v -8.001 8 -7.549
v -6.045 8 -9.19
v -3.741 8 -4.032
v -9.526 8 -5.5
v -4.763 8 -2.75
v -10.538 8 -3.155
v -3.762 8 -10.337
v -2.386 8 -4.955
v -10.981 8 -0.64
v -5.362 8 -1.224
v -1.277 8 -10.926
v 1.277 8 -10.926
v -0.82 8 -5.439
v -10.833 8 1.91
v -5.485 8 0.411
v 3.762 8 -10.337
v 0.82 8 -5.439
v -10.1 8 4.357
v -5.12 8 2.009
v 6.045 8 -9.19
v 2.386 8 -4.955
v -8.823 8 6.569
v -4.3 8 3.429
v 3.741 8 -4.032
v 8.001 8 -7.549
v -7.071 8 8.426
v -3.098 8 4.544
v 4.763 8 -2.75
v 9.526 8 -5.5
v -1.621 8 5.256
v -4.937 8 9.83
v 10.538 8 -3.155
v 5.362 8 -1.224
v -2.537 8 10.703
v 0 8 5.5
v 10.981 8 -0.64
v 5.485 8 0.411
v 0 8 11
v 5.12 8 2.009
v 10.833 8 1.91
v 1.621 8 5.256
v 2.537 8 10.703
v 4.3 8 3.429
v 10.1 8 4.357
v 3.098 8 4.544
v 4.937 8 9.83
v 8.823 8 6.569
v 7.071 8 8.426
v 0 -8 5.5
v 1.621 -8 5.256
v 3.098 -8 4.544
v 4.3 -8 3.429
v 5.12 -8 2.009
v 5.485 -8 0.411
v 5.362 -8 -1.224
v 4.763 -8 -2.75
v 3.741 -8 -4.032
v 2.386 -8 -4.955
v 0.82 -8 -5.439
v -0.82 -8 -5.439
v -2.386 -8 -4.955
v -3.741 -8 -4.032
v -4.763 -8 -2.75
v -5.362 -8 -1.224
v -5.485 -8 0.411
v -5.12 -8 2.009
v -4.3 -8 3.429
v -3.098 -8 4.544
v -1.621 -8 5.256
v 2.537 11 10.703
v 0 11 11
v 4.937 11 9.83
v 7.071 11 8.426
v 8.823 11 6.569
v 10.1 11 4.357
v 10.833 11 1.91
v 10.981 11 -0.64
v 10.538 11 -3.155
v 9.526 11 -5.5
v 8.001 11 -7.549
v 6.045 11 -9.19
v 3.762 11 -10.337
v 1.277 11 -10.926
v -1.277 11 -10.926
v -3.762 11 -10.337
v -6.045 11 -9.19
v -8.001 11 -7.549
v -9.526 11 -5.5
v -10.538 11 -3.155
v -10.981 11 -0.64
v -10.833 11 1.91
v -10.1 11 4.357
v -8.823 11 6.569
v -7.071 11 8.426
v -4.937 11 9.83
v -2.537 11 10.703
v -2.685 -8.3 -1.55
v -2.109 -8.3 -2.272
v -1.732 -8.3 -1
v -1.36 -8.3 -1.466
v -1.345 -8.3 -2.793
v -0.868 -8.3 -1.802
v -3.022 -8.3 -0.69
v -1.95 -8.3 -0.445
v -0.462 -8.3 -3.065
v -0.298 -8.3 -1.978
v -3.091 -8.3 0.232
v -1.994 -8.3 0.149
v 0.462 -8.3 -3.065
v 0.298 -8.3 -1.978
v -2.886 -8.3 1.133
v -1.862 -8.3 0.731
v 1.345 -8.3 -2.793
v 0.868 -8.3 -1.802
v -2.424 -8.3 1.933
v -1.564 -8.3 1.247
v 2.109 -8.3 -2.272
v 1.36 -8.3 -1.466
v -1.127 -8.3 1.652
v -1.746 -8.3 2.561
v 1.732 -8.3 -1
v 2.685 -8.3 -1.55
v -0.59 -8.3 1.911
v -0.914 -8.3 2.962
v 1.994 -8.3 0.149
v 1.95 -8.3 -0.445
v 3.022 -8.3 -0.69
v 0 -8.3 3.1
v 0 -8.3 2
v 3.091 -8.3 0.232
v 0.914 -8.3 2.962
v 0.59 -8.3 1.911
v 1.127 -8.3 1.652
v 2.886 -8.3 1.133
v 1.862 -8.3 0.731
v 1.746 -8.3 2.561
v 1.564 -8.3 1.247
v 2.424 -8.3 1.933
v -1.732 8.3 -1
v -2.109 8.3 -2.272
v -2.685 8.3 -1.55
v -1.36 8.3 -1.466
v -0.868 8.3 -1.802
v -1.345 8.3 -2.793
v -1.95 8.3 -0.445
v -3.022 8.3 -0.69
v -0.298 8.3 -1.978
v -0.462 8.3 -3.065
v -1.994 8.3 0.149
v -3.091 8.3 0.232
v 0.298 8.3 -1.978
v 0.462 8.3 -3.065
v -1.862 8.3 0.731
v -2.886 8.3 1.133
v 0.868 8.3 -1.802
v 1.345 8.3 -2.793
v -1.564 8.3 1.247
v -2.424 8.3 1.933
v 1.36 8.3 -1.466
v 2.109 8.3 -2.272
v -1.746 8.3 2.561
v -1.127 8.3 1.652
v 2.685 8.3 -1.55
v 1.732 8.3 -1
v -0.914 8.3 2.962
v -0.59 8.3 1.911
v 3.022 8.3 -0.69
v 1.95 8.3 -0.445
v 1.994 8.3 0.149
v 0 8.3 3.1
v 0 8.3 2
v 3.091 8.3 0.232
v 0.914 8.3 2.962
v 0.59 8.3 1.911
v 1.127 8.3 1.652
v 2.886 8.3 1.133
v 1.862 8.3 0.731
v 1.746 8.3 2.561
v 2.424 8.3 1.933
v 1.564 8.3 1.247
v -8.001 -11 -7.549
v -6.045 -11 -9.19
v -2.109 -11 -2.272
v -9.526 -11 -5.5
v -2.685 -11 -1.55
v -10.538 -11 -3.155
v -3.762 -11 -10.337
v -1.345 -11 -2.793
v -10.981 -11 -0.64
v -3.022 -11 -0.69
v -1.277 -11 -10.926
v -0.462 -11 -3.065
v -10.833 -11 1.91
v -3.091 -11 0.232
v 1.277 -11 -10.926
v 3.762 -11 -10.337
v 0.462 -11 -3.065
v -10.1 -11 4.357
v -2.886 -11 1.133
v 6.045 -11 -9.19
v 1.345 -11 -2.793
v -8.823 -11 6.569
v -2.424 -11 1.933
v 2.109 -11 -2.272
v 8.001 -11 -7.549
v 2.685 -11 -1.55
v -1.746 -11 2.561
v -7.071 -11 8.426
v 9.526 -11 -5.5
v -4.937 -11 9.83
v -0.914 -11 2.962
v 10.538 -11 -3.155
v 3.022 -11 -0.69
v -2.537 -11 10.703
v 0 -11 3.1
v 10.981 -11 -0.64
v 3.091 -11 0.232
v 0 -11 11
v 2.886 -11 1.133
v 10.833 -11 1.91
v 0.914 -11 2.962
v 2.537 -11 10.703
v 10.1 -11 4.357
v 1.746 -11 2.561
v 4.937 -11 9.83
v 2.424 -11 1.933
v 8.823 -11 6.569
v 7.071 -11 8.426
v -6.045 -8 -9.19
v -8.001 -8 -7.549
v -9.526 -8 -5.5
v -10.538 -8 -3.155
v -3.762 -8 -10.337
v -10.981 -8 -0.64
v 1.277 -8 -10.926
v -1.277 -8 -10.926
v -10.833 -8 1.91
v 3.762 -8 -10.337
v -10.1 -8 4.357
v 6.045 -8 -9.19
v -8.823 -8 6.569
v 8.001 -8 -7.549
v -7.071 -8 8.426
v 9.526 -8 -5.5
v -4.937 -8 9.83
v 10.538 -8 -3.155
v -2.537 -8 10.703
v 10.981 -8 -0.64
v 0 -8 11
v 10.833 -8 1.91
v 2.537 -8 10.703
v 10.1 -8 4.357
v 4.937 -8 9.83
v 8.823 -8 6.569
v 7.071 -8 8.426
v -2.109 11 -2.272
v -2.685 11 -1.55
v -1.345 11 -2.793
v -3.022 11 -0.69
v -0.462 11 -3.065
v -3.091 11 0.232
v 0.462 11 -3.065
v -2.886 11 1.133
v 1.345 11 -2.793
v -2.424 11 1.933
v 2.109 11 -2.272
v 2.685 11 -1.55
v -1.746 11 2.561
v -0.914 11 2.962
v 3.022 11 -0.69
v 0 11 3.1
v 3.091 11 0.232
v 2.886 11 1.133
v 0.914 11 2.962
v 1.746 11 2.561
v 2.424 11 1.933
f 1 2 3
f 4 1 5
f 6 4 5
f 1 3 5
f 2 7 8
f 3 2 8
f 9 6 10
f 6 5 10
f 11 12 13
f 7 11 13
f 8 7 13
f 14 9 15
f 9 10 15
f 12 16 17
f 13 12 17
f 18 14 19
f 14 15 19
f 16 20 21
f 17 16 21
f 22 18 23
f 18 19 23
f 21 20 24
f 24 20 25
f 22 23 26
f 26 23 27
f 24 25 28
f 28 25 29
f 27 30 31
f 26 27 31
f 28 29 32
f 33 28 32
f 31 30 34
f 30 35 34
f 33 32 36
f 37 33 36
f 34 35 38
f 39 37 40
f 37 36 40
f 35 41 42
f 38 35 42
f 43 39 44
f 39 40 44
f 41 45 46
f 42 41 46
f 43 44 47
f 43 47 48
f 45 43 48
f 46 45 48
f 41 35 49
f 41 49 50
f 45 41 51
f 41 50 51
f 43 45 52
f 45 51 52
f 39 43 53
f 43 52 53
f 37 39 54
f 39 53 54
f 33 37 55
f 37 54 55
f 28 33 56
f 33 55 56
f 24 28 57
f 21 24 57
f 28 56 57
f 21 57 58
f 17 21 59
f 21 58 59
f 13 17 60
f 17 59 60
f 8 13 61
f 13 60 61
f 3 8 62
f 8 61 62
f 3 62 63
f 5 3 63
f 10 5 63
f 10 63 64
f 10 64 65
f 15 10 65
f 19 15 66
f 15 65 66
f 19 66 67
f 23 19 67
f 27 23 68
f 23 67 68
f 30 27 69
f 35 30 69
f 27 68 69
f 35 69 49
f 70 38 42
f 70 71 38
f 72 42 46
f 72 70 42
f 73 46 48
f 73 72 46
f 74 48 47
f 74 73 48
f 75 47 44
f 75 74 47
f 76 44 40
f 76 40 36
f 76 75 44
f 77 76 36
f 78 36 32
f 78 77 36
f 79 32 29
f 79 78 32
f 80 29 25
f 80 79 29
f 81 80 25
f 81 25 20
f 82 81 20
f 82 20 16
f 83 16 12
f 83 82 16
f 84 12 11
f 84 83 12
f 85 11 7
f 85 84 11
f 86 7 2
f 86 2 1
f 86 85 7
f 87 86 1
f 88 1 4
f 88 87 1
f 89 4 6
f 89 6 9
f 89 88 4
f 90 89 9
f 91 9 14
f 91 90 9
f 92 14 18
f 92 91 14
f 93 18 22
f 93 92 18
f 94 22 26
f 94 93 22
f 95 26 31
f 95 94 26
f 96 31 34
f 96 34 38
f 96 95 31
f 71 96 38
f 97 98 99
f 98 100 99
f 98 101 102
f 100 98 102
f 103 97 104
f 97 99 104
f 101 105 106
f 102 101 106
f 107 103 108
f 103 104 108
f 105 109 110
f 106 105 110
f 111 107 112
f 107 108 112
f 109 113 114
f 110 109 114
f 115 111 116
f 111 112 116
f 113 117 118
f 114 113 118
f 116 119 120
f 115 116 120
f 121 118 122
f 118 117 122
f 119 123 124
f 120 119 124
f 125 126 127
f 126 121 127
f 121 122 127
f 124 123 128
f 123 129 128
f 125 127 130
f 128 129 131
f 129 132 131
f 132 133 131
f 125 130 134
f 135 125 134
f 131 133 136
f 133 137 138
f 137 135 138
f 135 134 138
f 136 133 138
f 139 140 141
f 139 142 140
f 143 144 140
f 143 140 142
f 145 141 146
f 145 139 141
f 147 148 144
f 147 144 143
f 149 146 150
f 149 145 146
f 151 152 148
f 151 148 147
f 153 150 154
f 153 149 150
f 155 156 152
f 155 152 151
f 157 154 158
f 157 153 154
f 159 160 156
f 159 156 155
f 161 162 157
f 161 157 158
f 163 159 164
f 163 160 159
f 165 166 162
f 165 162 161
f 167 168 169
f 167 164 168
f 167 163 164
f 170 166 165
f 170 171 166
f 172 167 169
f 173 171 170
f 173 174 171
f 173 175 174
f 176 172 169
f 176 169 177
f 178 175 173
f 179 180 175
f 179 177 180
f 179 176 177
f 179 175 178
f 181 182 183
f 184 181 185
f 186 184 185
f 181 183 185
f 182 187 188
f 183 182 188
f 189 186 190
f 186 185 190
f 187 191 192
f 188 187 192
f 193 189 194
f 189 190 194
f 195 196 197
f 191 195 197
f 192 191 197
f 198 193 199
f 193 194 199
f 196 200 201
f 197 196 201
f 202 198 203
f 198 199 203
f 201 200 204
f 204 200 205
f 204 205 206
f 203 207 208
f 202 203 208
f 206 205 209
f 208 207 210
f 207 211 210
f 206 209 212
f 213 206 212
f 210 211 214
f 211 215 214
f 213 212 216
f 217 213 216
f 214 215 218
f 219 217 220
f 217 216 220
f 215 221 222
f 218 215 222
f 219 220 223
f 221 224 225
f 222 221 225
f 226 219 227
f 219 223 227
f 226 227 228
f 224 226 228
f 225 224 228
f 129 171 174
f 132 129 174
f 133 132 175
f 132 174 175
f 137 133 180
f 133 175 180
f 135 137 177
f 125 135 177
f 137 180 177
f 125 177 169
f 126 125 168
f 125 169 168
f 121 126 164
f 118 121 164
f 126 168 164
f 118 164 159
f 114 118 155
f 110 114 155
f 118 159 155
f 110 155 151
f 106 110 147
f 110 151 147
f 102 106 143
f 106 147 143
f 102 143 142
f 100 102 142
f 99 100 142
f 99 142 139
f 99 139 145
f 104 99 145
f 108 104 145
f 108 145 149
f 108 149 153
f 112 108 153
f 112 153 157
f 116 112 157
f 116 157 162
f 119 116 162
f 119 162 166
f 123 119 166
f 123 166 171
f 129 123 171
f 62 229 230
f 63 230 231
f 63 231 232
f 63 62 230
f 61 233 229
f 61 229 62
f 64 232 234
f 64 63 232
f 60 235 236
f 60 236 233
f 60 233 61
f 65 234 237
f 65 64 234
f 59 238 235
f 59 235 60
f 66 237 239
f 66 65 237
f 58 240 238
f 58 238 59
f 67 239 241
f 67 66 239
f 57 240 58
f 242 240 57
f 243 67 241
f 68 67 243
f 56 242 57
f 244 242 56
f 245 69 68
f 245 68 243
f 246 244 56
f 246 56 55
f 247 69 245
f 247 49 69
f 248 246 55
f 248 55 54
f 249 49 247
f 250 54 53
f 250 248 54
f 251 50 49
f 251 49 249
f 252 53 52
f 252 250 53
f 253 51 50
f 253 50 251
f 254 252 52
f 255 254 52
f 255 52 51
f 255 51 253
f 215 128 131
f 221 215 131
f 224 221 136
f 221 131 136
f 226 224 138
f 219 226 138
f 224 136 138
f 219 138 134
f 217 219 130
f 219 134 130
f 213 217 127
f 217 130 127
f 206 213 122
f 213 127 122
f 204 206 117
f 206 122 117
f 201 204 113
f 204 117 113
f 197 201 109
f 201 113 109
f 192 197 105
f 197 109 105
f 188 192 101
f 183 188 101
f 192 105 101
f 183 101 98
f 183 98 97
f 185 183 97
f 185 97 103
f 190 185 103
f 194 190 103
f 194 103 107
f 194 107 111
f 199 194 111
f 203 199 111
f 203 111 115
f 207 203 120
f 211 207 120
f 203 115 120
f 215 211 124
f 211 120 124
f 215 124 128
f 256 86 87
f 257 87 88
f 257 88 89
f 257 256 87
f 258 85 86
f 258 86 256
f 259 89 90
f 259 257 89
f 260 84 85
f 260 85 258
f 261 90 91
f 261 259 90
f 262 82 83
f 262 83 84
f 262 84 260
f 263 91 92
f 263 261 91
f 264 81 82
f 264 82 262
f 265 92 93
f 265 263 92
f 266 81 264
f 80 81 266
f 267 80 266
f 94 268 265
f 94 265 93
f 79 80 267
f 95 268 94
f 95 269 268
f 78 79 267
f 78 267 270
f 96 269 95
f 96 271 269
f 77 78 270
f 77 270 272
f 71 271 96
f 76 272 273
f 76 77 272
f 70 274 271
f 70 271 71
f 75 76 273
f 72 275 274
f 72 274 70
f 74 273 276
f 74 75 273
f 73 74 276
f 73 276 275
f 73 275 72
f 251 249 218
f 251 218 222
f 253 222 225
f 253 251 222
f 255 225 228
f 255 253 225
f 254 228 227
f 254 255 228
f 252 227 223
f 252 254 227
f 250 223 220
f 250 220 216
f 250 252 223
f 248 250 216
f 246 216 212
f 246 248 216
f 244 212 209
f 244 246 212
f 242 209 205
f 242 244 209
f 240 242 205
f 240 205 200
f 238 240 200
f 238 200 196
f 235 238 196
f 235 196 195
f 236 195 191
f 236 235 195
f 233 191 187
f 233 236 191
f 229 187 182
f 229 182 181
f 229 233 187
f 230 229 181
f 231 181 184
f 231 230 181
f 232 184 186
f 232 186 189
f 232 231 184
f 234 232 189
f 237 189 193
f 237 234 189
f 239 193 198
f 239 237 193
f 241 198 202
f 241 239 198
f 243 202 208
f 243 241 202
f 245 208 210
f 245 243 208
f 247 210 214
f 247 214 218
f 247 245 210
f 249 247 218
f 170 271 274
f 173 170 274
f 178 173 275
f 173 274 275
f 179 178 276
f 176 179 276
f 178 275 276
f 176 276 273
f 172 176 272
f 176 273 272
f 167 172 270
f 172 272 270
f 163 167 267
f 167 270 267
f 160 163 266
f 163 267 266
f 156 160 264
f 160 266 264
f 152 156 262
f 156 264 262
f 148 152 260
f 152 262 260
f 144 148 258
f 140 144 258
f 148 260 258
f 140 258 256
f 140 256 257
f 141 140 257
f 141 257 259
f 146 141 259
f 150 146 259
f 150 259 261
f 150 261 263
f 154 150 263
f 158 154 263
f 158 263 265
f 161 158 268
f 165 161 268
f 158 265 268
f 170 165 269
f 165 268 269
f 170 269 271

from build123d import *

# Parameters (mm, degrees)
SKETCH_1_R          = 11
EXTRUDE_3_DEPTH     = 11
SKETCH_1_10_R       = 11
SKETCH_1_10_R_2     = 5.5
CUT_EXTRUDE_1_DEPTH = 8
SKETCH_2_R          = 2
CUT_EXTRUDE_2_DEPTH = 27.944387171
SKETCH_2_3_R        = 3.1
CUT_EXTRUDE_3_DEPTH = 2.7
CUT_EXTRUDE_START   = -19.3
SKETCH_2_4_R        = 3.1
CUT_EXTRUDE_4_DEPTH = 2.7


with BuildPart() as part:
    # 草图1 → 凸台-拉伸3 (new, symmetric)
    with BuildSketch(Plane(origin=(0, 0, 0), x_dir=(1, 0, 0), z_dir=(0, 1, 0))):
        with Locations(Location((0, 0, 0), (0, 0, 270))):
            Circle(SKETCH_1_R)
    extrude(amount=EXTRUDE_3_DEPTH, both=True)

    # 草图1<10> → 切除-拉伸1 (cut, symmetric)
    with BuildSketch(Plane(origin=(0, 0, 0), x_dir=(1, 0, 0), z_dir=(0, 1, 0))):
        with Locations(Location((0, 0, 0), (0, 0, 270))):
            Circle(SKETCH_1_10_R)
        with Locations(Location((0, 0, 0), (0, 0, 270))):
            Circle(SKETCH_1_10_R_2, mode=Mode.SUBTRACT)
    extrude(amount=CUT_EXTRUDE_1_DEPTH, both=True, mode=Mode.SUBTRACT)

    # 草图2 → 切除-拉伸2 (cut, through all)
    with BuildSketch(Plane(origin=(0, 11, 0), x_dir=(1, 0, 0), z_dir=(0, 1, 0))):
        with Locations(Location((0, 0, 0), (0, 0, 270))):
            Circle(SKETCH_2_R)
    extrude(amount=-CUT_EXTRUDE_2_DEPTH, mode=Mode.SUBTRACT)

    # 草图2<3> → 切除-拉伸3 (cut)
    with BuildSketch(Plane(origin=(0, 11, 0), x_dir=(1, 0, 0), z_dir=(0, 1, 0))):
        with Locations(Location((0, 0, 0), (0, 0, 270))):
            Circle(SKETCH_2_3_R)
    extrude(amount=-CUT_EXTRUDE_3_DEPTH, mode=Mode.SUBTRACT)

    # 草图2<4> → 切除-拉伸4 (cut)
    with BuildSketch(Plane(origin=(0, 11, 0), x_dir=(1, 0, 0), z_dir=(0, 1, 0)).offset(CUT_EXTRUDE_START)):
        with Locations(Location((0, 0, 0), (0, 0, 270))):
            Circle(SKETCH_2_4_R)
    extrude(amount=-CUT_EXTRUDE_4_DEPTH, mode=Mode.SUBTRACT)


solid = part.part
